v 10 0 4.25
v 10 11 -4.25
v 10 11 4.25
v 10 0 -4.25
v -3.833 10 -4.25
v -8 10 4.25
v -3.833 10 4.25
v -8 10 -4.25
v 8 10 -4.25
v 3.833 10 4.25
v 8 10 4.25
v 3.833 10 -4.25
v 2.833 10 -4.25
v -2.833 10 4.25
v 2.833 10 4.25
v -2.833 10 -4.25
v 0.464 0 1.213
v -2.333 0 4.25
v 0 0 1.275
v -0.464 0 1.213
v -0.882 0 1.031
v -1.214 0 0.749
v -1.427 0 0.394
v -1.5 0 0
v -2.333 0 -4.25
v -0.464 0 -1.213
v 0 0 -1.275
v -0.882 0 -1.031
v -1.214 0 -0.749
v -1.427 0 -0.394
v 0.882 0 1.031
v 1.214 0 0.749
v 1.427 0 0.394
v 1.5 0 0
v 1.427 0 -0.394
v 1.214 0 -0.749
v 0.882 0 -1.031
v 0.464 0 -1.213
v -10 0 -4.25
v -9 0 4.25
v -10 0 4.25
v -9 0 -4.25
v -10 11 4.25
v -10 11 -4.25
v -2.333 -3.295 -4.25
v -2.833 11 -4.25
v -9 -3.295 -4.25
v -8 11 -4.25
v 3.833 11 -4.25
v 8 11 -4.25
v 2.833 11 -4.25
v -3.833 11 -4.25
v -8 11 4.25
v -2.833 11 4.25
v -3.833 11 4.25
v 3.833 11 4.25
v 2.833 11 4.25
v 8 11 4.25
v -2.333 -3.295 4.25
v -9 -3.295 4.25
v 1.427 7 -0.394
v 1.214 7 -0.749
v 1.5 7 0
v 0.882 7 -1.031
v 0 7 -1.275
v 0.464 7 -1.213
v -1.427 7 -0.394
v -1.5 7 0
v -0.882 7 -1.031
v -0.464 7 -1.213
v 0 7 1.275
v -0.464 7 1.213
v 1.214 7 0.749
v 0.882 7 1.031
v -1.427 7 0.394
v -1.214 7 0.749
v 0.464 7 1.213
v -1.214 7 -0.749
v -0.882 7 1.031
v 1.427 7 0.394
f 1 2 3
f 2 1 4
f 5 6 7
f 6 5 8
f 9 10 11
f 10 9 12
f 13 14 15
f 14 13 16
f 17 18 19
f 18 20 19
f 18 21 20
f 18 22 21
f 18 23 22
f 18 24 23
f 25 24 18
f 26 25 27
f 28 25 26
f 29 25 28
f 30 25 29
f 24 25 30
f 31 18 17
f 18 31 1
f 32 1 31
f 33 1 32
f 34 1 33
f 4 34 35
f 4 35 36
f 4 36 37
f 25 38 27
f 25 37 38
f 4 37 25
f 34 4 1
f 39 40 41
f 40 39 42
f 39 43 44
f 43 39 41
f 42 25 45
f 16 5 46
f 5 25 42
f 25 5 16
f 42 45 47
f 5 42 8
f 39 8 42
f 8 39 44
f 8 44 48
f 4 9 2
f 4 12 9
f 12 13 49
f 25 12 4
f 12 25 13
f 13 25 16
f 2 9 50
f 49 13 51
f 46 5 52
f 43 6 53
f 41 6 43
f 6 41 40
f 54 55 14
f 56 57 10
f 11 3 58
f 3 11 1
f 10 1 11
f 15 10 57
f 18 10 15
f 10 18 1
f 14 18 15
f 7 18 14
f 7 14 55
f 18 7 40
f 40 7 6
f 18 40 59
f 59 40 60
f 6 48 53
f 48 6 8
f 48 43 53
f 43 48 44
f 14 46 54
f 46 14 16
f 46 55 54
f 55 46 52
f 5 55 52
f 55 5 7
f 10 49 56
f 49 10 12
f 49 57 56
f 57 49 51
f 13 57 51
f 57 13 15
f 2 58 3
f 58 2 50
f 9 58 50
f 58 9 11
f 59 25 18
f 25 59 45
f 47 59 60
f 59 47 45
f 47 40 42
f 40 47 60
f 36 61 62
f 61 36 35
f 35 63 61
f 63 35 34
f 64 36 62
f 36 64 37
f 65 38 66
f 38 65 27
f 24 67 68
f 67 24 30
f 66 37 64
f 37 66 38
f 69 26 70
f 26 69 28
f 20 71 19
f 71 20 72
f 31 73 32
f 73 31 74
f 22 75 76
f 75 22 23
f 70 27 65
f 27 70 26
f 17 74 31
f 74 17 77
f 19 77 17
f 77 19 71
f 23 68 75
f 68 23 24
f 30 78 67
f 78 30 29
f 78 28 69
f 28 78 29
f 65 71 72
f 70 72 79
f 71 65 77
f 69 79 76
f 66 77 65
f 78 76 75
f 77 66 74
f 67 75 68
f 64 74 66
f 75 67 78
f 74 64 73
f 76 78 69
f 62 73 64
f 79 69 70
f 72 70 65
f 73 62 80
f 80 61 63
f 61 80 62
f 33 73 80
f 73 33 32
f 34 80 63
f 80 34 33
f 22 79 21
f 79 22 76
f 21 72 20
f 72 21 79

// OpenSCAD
// file: joystick_4_way_hat_mk1.scad
/*
	OpenJoystick - A project creating affordable, open source, 3D-printable custom flight-sim joysticks for everyone
	Copyright (C) 2012 Travis John Howse

	This program is free software: you can redistribute it and/or modify
	it under the terms of the GNU General Public License as published by
	the Free Software Foundation, either version 3 of the License, or
	(at your option) any later version.

	This program is distributed in the hope that it will be useful,
	but WITHOUT ANY WARRANTY; without even the implied warranty of
	MERCHANTABILITY or FITNESS FOR A PARTICULAR PURPOSE.  See the
	GNU General Public License for more details.

	You should have received a copy of the GNU General Public License
	along with this program.  If not, see <http://www.gnu.org/licenses/>.
*/

include <joystick_defines.scad>

// See joystick_defines for most of the guts.

//translate([0,0,10])
//	4_way_hat_washer();
//translate([0,0,13])
//	switch_hat_saddle();
//  switch_hat_hanoi();
//pb(1);

module hat_base(numDirs)
{
	difference()
	{
		cylinder(r=(4_way_hat_base_dia/2), h=4_way_hat_base_z, $fn=circle_faces);
		
		translate([0,pb_total_z+(4_way_hat_base_screw_dia/2),4_way_hat_base_z-pb_xy/2+zff])
			rotate([90,0,0])
				pb(1.02,0);
		translate([0,-pb_total_z-(4_way_hat_base_screw_dia/2),4_way_hat_base_z-pb_xy/2+zff])
			rotate([-90,180,0])
				pb(1.02,0);
		if (numDirs==4)
		{
			translate([pb_total_z+(4_way_hat_base_screw_dia/2),0,4_way_hat_base_z-pb_xy/2+zff])
				rotate([90,0,-90])
					pb(1.02,0);
			translate([-pb_total_z-(4_way_hat_base_screw_dia/2),0,4_way_hat_base_z-pb_xy/2+zff])
				rotate([-90,180,-90])
					pb(1.02,0);
//			// Now chop the bit out of the middle
			translate([0,0,4_way_hat_base_base_z+zff])
				//cube([4_way_hat_base_screw_dia+2*pb_btn_z+zff,4_way_hat_base_screw_dia+2*pb_btn_z+zff,10],center=true);
                cylinder(r=sqrt(pow((pb_btn_dia/2),2) + pow((4_way_hat_base_screw_dia/2+pb_btn_z),2)),h=10,$fn=circle_faces);
		} else	{
			// Now chop the bit out of the middle
			translate([0,0,4_way_hat_base_base_z+5])
				cube([4_way_hat_base_screw_dia,4_way_hat_base_screw_dia+2*pb_btn_z+zff,10],center=true);
		}

		// Now chop the bit out of the middle
		/*translate([0,0,4_way_hat_base_base_z+5])
			cube([pb_xy+zff,pb_xy+zff,10],center=true);*/

		// Screw
		translate([0,0,-1])
            union()
            {
                rotate([0,5,0]) cylinder(r=4_way_hat_base_screw_dia/2, h=4_way_hat_base_z*1, $fn=circle_faces);
                rotate([0,-5,0]) cylinder(r=4_way_hat_base_screw_dia/2, h=4_way_hat_base_z*1, $fn=circle_faces);
                rotate([5,0,0]) cylinder(r=4_way_hat_base_screw_dia/2, h=4_way_hat_base_z*1, $fn=circle_faces);
                rotate([-5,0,0]) cylinder(r=4_way_hat_base_screw_dia/2, h=4_way_hat_base_z*1, $fn=circle_faces);
                cylinder(r=4_way_hat_base_screw_dia/2, h=4_way_hat_base_z*1, $fn=circle_faces);
            }
	}		
}

module hat_voids(numDirs)
{
	difference()
	{
		cylinder(r=4_way_hat_base_dia/2, h=4_way_hat_base_z);		
		hat_base(numDirs);
	}
}

module switch_hat_saddle()
{
	step_size = 2; // Won't really work for anything other than 2, sorry.
	num_steps = 4_way_hat_base_dia / step_size;
	switch_hat_saddle_base_depth = 4;


	union()
	{
		translate([0,0,switch_hat_saddle_base_depth])
			intersection()
			{
				cylinder(r = (4_way_hat_base_dia/2), h = 10, $fn=circle_faces);
				for (n = [0:num_steps])
				{
					translate([-(4_way_hat_base_dia/2)+n*step_size+0.25*step_size,0,0])
						cube([step_size, 4_way_hat_base_dia, abs((num_steps/2)-n)*1.5],center=true);
				}
			}
		difference()
		{
			cylinder(r = (4_way_hat_base_dia/2), h = switch_hat_saddle_base_depth, $fn=circle_faces);
			translate([0,0,-zff])
				cylinder(r=(4_way_hat_base_screw_dia/2), h =switch_hat_saddle_base_depth, $fn=circle_faces);
		}
	}
}

module switch_hat_hanoi()
{
	
	difference()
	{
		union()
		{
			cylinder(r = (4_way_hat_base_dia/2), h = 2, $fn=circle_faces);
			translate([0,0,2])
			{
				for (n = [1:8])
				{
					cylinder(r = (4_way_hat_base_dia/2 - (n-1)), h = n*0.7, $fn=circle_faces);
				}
			}
		}
		translate([0,0,-zff])
			cylinder(r=(4_way_hat_base_screw_dia/2), h = 4, $fn=circle_faces);
	}	
}

module 4_way_hat_washer()
{
	difference()
	{
		cylinder(r=(4_way_hat_base_dia/2), h = 1, $fn=circle_faces);
		translate([0,0,-zff])
			cylinder(r=(4_way_hat_base_screw_dia/2), h = 1+2*zff, $fn=circle_faces);
	}
}

module hat_stem(height)
{
	bolt(8.5/2, 1.5, 4.5/2, height,0);
}
	
//hat_stem(11); // Face hats
hat_stem(23); // CMS
//switch_hat_hanoi();
// file: joystick_defines.scad
/*
	OpenJoystick - A project creating affordable, open source, 3D-printable custom flight-sim joysticks for everyone
	Copyright (C) 2012 Travis John Howse

	This program is free software: you can redistribute it and/or modify
	it under the terms of the GNU General Public License as published by
	the Free Software Foundation, either version 3 of the License, or
	(at your option) any later version.

	This program is distributed in the hope that it will be useful,
	but WITHOUT ANY WARRANTY; without even the implied warranty of
	MERCHANTABILITY or FITNESS FOR A PARTICULAR PURPOSE.  See the
	GNU General Public License for more details.

	You should have received a copy of the GNU General Public License
	along with this program.  If not, see <http://www.gnu.org/licenses/>.
*/

// Standard skate bearing
bearing_inside_dia = 8;
bearing_outside_dia = 22;
bearing_thickness = 7;

// Arbitrary value
shaft_dia = 16;

zff = 0.005;

extrusion_width = 0.8; // Used for single-wall support.

// Set this to 1 to translate everything to printable mode
printable_mode = 0;

// Gimbal core block sizes 
gimbal_core_x = 50;
gimbal_core_y = 30;
gimbal_core_z = gimbal_core_y;

// Gimbal frame sizes 
gimbal_frame_thickness = 10; 

circle_faces = 20;
$fn=circle_faces;

// The 1.8 is 2sin(45)ish, the maximum y on the xy plane the core can occupy
gimbal_frame_x = gimbal_core_x+2*gimbal_frame_thickness+2; // 2mm for washers
gimbal_frame_y = (gimbal_core_y * 1.8)+gimbal_frame_thickness;

// Frame is big enough to stop the core colliding at 45 degree rotation.
gimbal_frame_z = sqrt(pow(gimbal_core_z,2)/2) * 2 + 2; // 2 fudge to allow for clearance at tips.

max_angle = 45; // Not much comes off this, should probably build it in more places.

module bearing(hole,outer_puff)
{
	difference()
	{
		cylinder(h=bearing_thickness, r = (bearing_outside_dia/2)+outer_puff);

		if (hole)
		{
			translate([0,0,-zff])
				cylinder(h=9, r = (bearing_inside_dia/2));
		}
	}
}

// Hat sizes
// Note that many other settings for the hats are in their own .scad, only stuff relevant to the rest of the stick is here.
pb_xy = 6;
pb_z = 4; // Height minus pushbutton
pb_btn_z = 1;
pb_total_z = pb_z+pb_btn_z;
pb_btn_dia = 3.5;
pb_leg_x = 4;
pb_leg_y = 5;
pb_leg_z = 0.7;

lever_switch_x = 12.85;
lever_switch_y = 6.5;
lever_switch_z = 5.8;

4_way_hat_base_dia = 18;
4_way_hat_base_base_z = 1.5; // Base thickness
4_way_hat_base_z = pb_xy + 4_way_hat_base_base_z;
4_way_hat_base_screw_dia = 5;
4_way_hat_base_screw_head_dia = 8.25;
4_way_hat_base_screw_head_thk = 3;
4_way_hat_wire_gap = 3;
4_way_hat_cutout_z = 4_way_hat_base_z + 4_way_hat_base_screw_head_thk;

// Grip sizes
grip_height = 100;
grip_diameter = 44;
grip_clip = 33;
grip_rest_thickness = 5;
grip_rest_diameter = 80;
grip_cms_height_offset = 50;
grip_cms_offset = -5;
grip_cms_angle = 30;
grip_cms_stub_length = 40;
grip_cms_stub_diameter = 4_way_hat_base_dia;
grip_cms_twist = 15;

grip_head_offset_x = -10;
grip_head_box_x = 4_way_hat_base_dia * 2.5;
grip_head_box_y = 4_way_hat_base_dia * 2.2;
grip_head_box_z = 4_way_hat_base_dia * 2;

joystick_head_trigger_thickness = pb_xy;

my_layer_thickness = 0.35;

joystick_big_btn_height = 8;
joystick_big_btn_diameter = 8.0;
joystick_big_btn_clippyness = 3;

headbolt_x = 10.8;
headbolt_y = -9;
headbolt_z = -11;
headbolt_extra = 8;

module hat_cutout(bloat)
{
	// Very similar to a hat, but it has a cross on the bottom and a peg to indicate where the cables will be run.
	translate([0,0,-4_way_hat_wire_gap-4_way_hat_base_z])
	union()
	{
		translate([0,0,4_way_hat_wire_gap])cylinder(r=(4_way_hat_base_dia/2)*bloat,h=4_way_hat_base_z);
		
		intersection()
		{
			cylinder(r=(4_way_hat_base_dia/2)*bloat,h=4_way_hat_base_z);
			union()
			{
				cube([100, pb_xy, 10],true);
				cube([pb_xy, 100, 10],true);
			}
		}
		translate([0,0,-4_way_hat_base_screw_head_thk+4_way_hat_wire_gap]) cylinder(r=(4_way_hat_base_screw_head_dia/2),h=4_way_hat_base_screw_head_thk,$fn=circle_faces);
	}
}

module pb(puff, legdir)
{
	translate([0,0,pb_z/2])
	{
		// Puff set to 1 if you want a realistic model of a button.
		// Puff variable used for making holes in things bigger than the button size
		cube([pb_xy*puff,pb_xy*puff,pb_z*puff],center=true);
	
		// Button knob itself
		translate([0,0,pb_z/2-zff])
			cylinder(r=(pb_btn_dia/2),h=pb_btn_z,$fn=circle_faces);
	
		// Button legs
		if (legdir == 0)
		{
			translate([0,-pb_xy/2-pb_leg_y/2+zff,-pb_z/2+pb_leg_z/2+0.8])
				cube([pb_xy,pb_leg_y,pb_leg_z],center=true);
		} else {
			translate([0,-pb_xy/2+pb_leg_z/2+zff-pb_leg_z,-pb_z/2-pb_leg_y/2+0.8])
				cube([pb_xy,pb_leg_z,pb_leg_y],center=true);
		}
	}

}

module bolt(cap_r, cap_z, shaft_r, shaft_z,slot_len)
{
	// Hex head bolt for holding head together
	cylinder(r=cap_r,h=cap_z);
	translate([0,0,cap_z]) cylinder(r=shaft_r+0.15, h=slot_len);
	translate([0,0,cap_z+slot_len]) cylinder(r=shaft_r, h=shaft_z-slot_len);
}

module fillet(radius, length)
{
	difference()
	{
		cube([radius,length,radius]);
		translate([radius,length+zff,radius]) rotate([90,0,0]) cylinder(r=radius,h=length+2*zff);
	}
}
// main file
/*
	OpenJoystick - A project creating affordable, open source, 3D-printable custom flight-sim joysticks for everyone
	Copyright (C) 2012 Travis John Howse

	This program is free software: you can redistribute it and/or modify
	it under the terms of the GNU General Public License as published by
	the Free Software Foundation, either version 3 of the License, or
	(at your option) any later version.

	This program is distributed in the hope that it will be useful,
	but WITHOUT ANY WARRANTY; without even the implied warranty of
	MERCHANTABILITY or FITNESS FOR A PARTICULAR PURPOSE.  See the
	GNU General Public License for more details.

	You should have received a copy of the GNU General Public License
	along with this program.  If not, see <http://www.gnu.org/licenses/>.
*/

include <joystick_defines.scad>
use <joystick_4_way_hat_mk1.scad>

throttle_right_x = 50;
throttle_right_y = 50;
throttle_right_z = 55;
//throttle_right_z = 70;

wall_thickness = 3;
//wall_thickness = 1;
plate_thickness = 4_way_hat_base_z-1;

screw_support_x = 10;

throttle_stem_x = 25;
throttle_stem_y = 60;
throttle_stem_z = 15;
throttle_stem_thickness = 3;

plate_clearance = 0.3;
plate_z_clearance = 0.3;
plate_clearance = 0.5;

3ts_x = 12.7;
3ts_y = 11.5;
3ts_z = 12.9;
3ts_thread_dia = 6;
3ts_thread_z = 9;
3ts_nut_dia = 9.1;
3ts_stem_dia = 2.9;
3ts_stem_z = 10.3;

// Based on measurements from a boat switch on the TM warthog
boat_switch_x = 20;
boat_switch_y = 10;
boat_switch_z = 10;
step_x = 2.5;
step_z = 0.8;

module throttle_right()
{
	difference()
	{
		union()
		{
			cube([throttle_right_x,throttle_right_y,throttle_right_z]);
			translate([throttle_right_x/2, throttle_right_y,0]) cylinder(r=throttle_right_x/2,h=throttle_right_z);
		}
		union()
		{
			translate([wall_thickness,wall_thickness,wall_thickness]) cube([throttle_right_x-wall_thickness+2*zff,throttle_right_y-wall_thickness,throttle_right_z-wall_thickness+2*zff]);
			translate([throttle_right_x/2, throttle_right_y,wall_thickness]) cylinder(r=(throttle_right_x/2)-wall_thickness,h=throttle_right_z-wall_thickness+2*zff);
		}
		// Hole for wires
		translate([throttle_right_x/2-wall_thickness,0,wall_thickness]) cube([wall_thickness*2,wall_thickness,wall_thickness]);
	}
	
	// Vertical screwholes
	translate([wall_thickness,wall_thickness+5,throttle_right_z-plate_thickness-plate_z_clearance]) screw_support(0);
	translate([wall_thickness,2*wall_thickness+throttle_right_y,throttle_right_z-plate_thickness-plate_z_clearance]) screw_support(0);
	translate([throttle_right_x-(screw_support_x/2)-plate_thickness-plate_z_clearance,wall_thickness,throttle_right_z-plate_thickness-plate_z_clearance]) rotate([0,0,90]) screw_support(0);
	translate([throttle_right_x-wall_thickness,2*wall_thickness+throttle_right_y,throttle_right_z-plate_thickness-plate_z_clearance]) rotate([0,0,180]) screw_support(0);
	
	// Horizontal screwholes
	translate([throttle_right_x-plate_thickness-plate_z_clearance,wall_thickness+screw_support_x/2,wall_thickness]) screw_support(1);
	translate([throttle_right_x-plate_thickness-plate_z_clearance,throttle_right_y-wall_thickness*2,wall_thickness]) screw_support(1);
	
	// Lip
	translate([throttle_right_x-wall_thickness-plate_thickness-plate_z_clearance,wall_thickness,wall_thickness]) cube([wall_thickness,throttle_right_y,wall_thickness]);
	translate([throttle_right_x-wall_thickness-plate_thickness-plate_z_clearance,wall_thickness,wall_thickness]) cube([wall_thickness,wall_thickness,throttle_right_z-plate_thickness-wall_thickness-plate_z_clearance]);
	translate([throttle_right_x-wall_thickness-plate_thickness-plate_z_clearance,throttle_right_y-wall_thickness,wall_thickness]) cube([wall_thickness,wall_thickness*2,throttle_right_z-plate_thickness-wall_thickness-plate_z_clearance]);
	translate([throttle_right_x-wall_thickness-plate_thickness-plate_z_clearance,throttle_right_y,wall_thickness]) 
		cube([plate_thickness+plate_z_clearance,wall_thickness,throttle_right_z-plate_thickness-wall_thickness-plate_z_clearance]);
	
	translate([throttle_right_x/2-throttle_stem_x/2,0.5,0]) throttle_stem();
}

module throttle_stem()
{	
	hinge_sleve_z = throttle_stem_z+10;

	translate([0,-throttle_stem_y,0])
	union()
	{
		difference()
		{
			cube([throttle_stem_x-zff, throttle_stem_y-zff, throttle_stem_z-zff]);
			translate([throttle_stem_thickness,0,throttle_stem_thickness]) cube([throttle_stem_x-2*throttle_stem_thickness, throttle_stem_y, throttle_stem_z-throttle_stem_thickness]);
			translate([throttle_stem_x/2,10,0]) cylinder(r=4,h=hinge_sleve_z);
		}
		translate([throttle_stem_x/2,10,0]) difference()
		{
			union()
			{
				cylinder(r=6,h=hinge_sleve_z);
				translate([-throttle_stem_x/2,-1.5,0]) cube([throttle_stem_x,3,throttle_stem_z]);
			}
			cylinder(r=4,h=hinge_sleve_z);
		}
	}
}

module throttle_endplate()
{
	switch_spacing = 13;
	difference()
	{
		union()
		{
			translate([0,0,zff])
				cube([throttle_right_x-wall_thickness-plate_clearance,throttle_right_y-wall_thickness-plate_clearance,plate_thickness-2*zff]);
			translate([0,0,zff]) translate([(throttle_right_x-2*wall_thickness)/2-plate_clearance/2,throttle_right_y-wall_thickness-plate_clearance,0])
				//cylinder(r=(throttle_right_x-2*wall_thickness)/2,h=plate_thickness-2*zff);
				cylinder(r=(throttle_right_x-2*wall_thickness-plate_clearance)/2,h=plate_thickness-2*zff);
			translate([throttle_right_x/2-wall_thickness,throttle_right_y/6+switch_spacing,plate_thickness]) 3_throw_switch_adds();
			translate([throttle_right_x/2-wall_thickness,throttle_right_y/6+2*switch_spacing,plate_thickness]) 3_throw_1_no_adds();
		}
		
		translate([screw_support_x/2-plate_clearance/2,screw_support_x/2-plate_clearance/2,plate_thickness+zff]) rotate([0,180,0]) bolt(3,3,1.45,20,20);
		translate([throttle_right_x-(screw_support_x/2)-plate_thickness-wall_thickness-plate_clearance/2-plate_z_clearance,screw_support_x/2-plate_clearance/2,plate_thickness+zff]) rotate([0,180,0]) bolt(3,3,1.45,20,20);
		translate([screw_support_x/2-plate_clearance/2,2*wall_thickness+throttle_right_y-wall_thickness-plate_clearance/2,plate_thickness+zff]) rotate([0,180,0]) bolt(3,3,1.45,20,20);
		translate([throttle_right_x-2*wall_thickness-screw_support_x/2-plate_clearance/2,2*wall_thickness+throttle_right_y-wall_thickness-plate_clearance/2,plate_thickness+zff]) rotate([0,180,0]) bolt(3,3,1.45,20,20);
		
		translate([throttle_right_x/2-wall_thickness,throttle_right_y+switch_spacing/2,-1]) hat_voids(4);
		translate([throttle_right_x/2-wall_thickness,throttle_right_y/6,-1]) rotate([0,0,90]) hat_voids(2);
		//translate([throttle_right_x/2-wall_thickness,throttle_right_y/6+switch_spacing,-1]) rotate([0,0,90]) hat_voids(2);
		translate([throttle_right_x/2-wall_thickness,throttle_right_y/6+switch_spacing,-1+zff]) 3_throw_switch_voids();
		//translate([throttle_right_x/2-wall_thickness,throttle_right_y/6+2*switch_spacing,-1]) rotate([0,0,90]) hat_voids(2);
		//translate([throttle_right_x/2-wall_thickness,throttle_right_y/6+2*switch_spacing,-1]) 3_throw_switch_voids();
		translate([throttle_right_x/2-wall_thickness,throttle_right_y/6+2*switch_spacing,-1+zff]) #3_throw_1_no_voids(position)
		
		translate([throttle_right_x-wall_thickness-plate_thickness/2-plate_clearance/2,(throttle_right_y-wall_thickness)/2-3,plate_thickness+zff]) rotate([0,180,0]) bolt(3,3,1.45,20,20);
		
	}
}

module throttle_backplate()
{
	switch_spacing = 21;
	top_dist = 2*throttle_right_y/3;
	
	//wall_thickness+screw_support_x/2
	
	difference()
	{
		translate([0,0,-zff]) cube([throttle_right_z-wall_thickness-plate_thickness-plate_clearance,throttle_right_y-wall_thickness-plate_clearance,plate_thickness]);
	
		translate([throttle_right_z-wall_thickness-plate_thickness-screw_support_x/2-plate_clearance/2,screw_support_x/2-plate_clearance/2,plate_thickness+zff]) rotate([0,180,0]) bolt(3,3,1.45,20,20);
		translate([throttle_right_z-wall_thickness-plate_thickness-screw_support_x/2-plate_clearance/2,throttle_right_y-3*wall_thickness-plate_clearance/2,plate_thickness+zff]) rotate([0,180,0]) bolt(3,3,1.45,20,20);
	
		translate([(throttle_right_z-wall_thickness-plate_thickness)/2-switch_spacing/2,top_dist,-1]) hat_voids(4);
		translate([(throttle_right_z-wall_thickness-plate_thickness)/2+switch_spacing/2,top_dist,-1]) hat_voids(4);
		
		translate([-6,(throttle_right_y-wall_thickness)/2-3,plate_thickness/2]) rotate([0,90,0]) bolt(3,3,1.45,20,0);
	}
}

module screw_support(orient)
{
	// orient 0 - vertical, 1 - horizontal.
	
	height = 20;
	
	if (orient == 0)
	{
		translate([5,0,-height]) difference()
		{
			union()
			{
				cylinder(r=screw_support_x/2,h=height);
				translate([-(screw_support_x/2),-(screw_support_x/2),0]) cube([screw_support_x/2,screw_support_x,height]);
			}
			translate([0,0,height+3.1]) rotate([180,0,0]) bolt(3,3,1.45,20,0);
			translate([-(screw_support_x/2),-(screw_support_x/2),0]) rotate([0,45,0]) cube([100,100,100]);
		}
	} else {
		translate([-height,0,5]) rotate([0,-90,180]) difference()
			{
				union()
				{
					cylinder(r=screw_support_x/2,h=height);
					translate([-(screw_support_x/2),-(screw_support_x/2),0]) cube([screw_support_x/2,screw_support_x,height]);
				}
				translate([0,0,height+3.1]) rotate([180,0,0]) bolt(3,3,1.45,20,0);
			}
	}
}

module 3_throw_switch(position)
{
	// I've currently got a DPDT switch which is bigger than it needs to be
	// What I'm using:
	// http://www.jaycar.com.au/productView.asp?ID=ST0356&form=CAT2&SUBCATID=978#1
	// What I should be using.
	// http://www.jaycar.com.au/productView.asp?ID=ST0336&form=CAT2&SUBCATID=978#1
	// Hopefully it's only a single dimension that needs to change.
	

	angle = position;	
	
	translate([-3ts_x/2,-3ts_y/2,-3ts_z]) cube([3ts_x,3ts_y,3ts_z]);
	translate([0,0,-zff]) cylinder(r=3ts_thread_dia/2,h=3ts_thread_z);
	translate([0,0,3ts_thread_z-2*zff]) rotate([0,angle,0]) cylinder(r=3ts_stem_dia/2,h=3ts_stem_z);	
}

module 3_throw_1_no(position)
{
	spring_length = 15;
	spring_angle = 30;
	spring_dia = 4.5;
	spring_offset = 1;
	
	3_throw_switch(position);
	
	translate([-boat_switch_x/2+pb_xy/2,0,plate_thickness-pb_z/2+0.5]) rotate([0,0,-90]) pb(1.02,1);
	translate([-boat_switch_x/2-pb_leg_z/2,0,plate_thickness]) rotate([0,0,-90]) cube([pb_xy*1.02,pb_leg_z,plate_thickness],true);
}

module 3_throw_switch_voids()
{
	translate([0,0,-1.5]) 3_throw_switch(0);
	//translate([0,0,20.8-7]) boat_switch();
}

module 3_throw_1_no_voids()
{
	translate([0,0,-1.5]) 3_throw_1_no(0);
}

module 3_throw_switch_adds()
{
	translate([-boat_switch_x/2,boat_switch_y/2,0]) cube([boat_switch_x,2,9]);
	translate([-boat_switch_x/2,-boat_switch_y/2-2,0]) cube([boat_switch_x,2,9]);
}

module 3_throw_1_no_adds()
{
	guide_z = 4;
	translate([-boat_switch_x/2,boat_switch_y/2,0]) cube([boat_switch_x,2,9]);
	translate([-boat_switch_x/2,-boat_switch_y/2-2,0]) cube([boat_switch_x,2,9]);

}

module boat_switch()
{		
	difference()
	{
		translate([-boat_switch_x/2,-boat_switch_y/2,0]) difference()
		{
			cube([boat_switch_x,boat_switch_y,boat_switch_z]);
			translate([step_x,0,boat_switch_z-step_z]) cube([boat_switch_x-2*step_x,boat_switch_y,step_z+zff]);
			translate([2*step_x,0,boat_switch_z-2*step_z]) cube([boat_switch_x-4*step_x,boat_switch_y,step_z+zff]);
			translate([3*step_x,0,boat_switch_z-3*step_z]) cube([boat_switch_x-6*step_x,boat_switch_y,step_z+zff]);
		}		
		#cylinder(r=1.5,h=7);
	}
}

module china_switch()
{
	// Based on measurements from a boat switch on the TM warthog
	china_switch_x = 20;
	china_switch_y = 10;
	china_switch_z = 10;
	plateau = 4;
	
	difference()
	{
		translate([-china_switch_x/2,-china_switch_y/2,0]) difference()
		{
			cube([china_switch_x,china_switch_y,china_switch_z]);
			scale([1,1,0.5]) translate([-plateau/2,0,china_switch_z*2]) rotate([90,0,0]) translate([0,0,-china_switch_y-zff]) cylinder(r=10,h=china_switch_y+2*zff);
			scale([1,1,0.5]) translate([china_switch_x+plateau/2,0,china_switch_z*2]) rotate([90,0,0]) translate([0,0,-china_switch_y-zff]) cylinder(r=10,h=china_switch_y+2*zff);
			
		}
		// This one doesn't go onto a switch, rather it's a 2-way hat.
		cylinder(r=4.5/2,h=7);
	}
}

module airbrake_switch()
{
	ridge_z = 1;
	ridge_x = 1;
	rotate([-90,0,0])
	difference()
	{
		translate([-boat_switch_x/2,-boat_switch_y/2,0]) union()
		{
			cube([boat_switch_x,boat_switch_y,boat_switch_z]);
			translate([0,0,boat_switch_z]) cube([ridge_x*2,boat_switch_y,ridge_z]);
			translate([boat_switch_x/3-ridge_x/2,0,boat_switch_z]) cube([ridge_x,boat_switch_y,ridge_z]);
			translate([(2*boat_switch_x)/3-ridge_x/2,0,boat_switch_z]) cube([ridge_x,boat_switch_y,ridge_z]);
			translate([boat_switch_x-ridge_x*2,0,boat_switch_z]) cube([ridge_x*2,boat_switch_y,ridge_z]);
					
			translate([1,0,-3ts_stem_z+7+zff]) cube([boat_switch_x/3,boat_switch_y,3ts_stem_z-7]);
		}		
		cylinder(r=1.5,h=7);
	}
}

explodedist = 0;
//throttle_endplate();
scale([1,1,0.85]) airbrake_switch();

//throttle_backplate();

//screw_support(1);

//translate([0,0,20 - ($t*20)]) translate([wall_thickness,wall_thickness,throttle_right_z-plate_thickness]) color("cyan") throttle_endplate();
//translate([20-($t*20),0,0]) translate([throttle_right_x-plate_thickness,wall_thickness,throttle_right_z-plate_thickness]) rotate([0,90,0]) color("cyan") throttle_backplate();

//3_throw_1_no(0);

//throttle_stem();

//throttle_right();

//switch_hinge();
//china_switch();
//scale([1,0.85,1]) boat_switch();

//3_throw_switch_voids();
//hat_voids(2);

//3_throw_1_no_adds();

if (0)
{
	union()
	{
		throttle_right();
		translate([wall_thickness+plate_clearance/2,wall_thickness+plate_clearance/2,throttle_right_z-plate_thickness+explodedist]) #throttle_endplate();
		translate([throttle_right_x-plate_thickness+explodedist,wall_thickness+plate_clearance/2,throttle_right_z-plate_thickness-plate_clearance/2]) rotate([0,90,0]) throttle_backplate();
	}
}
